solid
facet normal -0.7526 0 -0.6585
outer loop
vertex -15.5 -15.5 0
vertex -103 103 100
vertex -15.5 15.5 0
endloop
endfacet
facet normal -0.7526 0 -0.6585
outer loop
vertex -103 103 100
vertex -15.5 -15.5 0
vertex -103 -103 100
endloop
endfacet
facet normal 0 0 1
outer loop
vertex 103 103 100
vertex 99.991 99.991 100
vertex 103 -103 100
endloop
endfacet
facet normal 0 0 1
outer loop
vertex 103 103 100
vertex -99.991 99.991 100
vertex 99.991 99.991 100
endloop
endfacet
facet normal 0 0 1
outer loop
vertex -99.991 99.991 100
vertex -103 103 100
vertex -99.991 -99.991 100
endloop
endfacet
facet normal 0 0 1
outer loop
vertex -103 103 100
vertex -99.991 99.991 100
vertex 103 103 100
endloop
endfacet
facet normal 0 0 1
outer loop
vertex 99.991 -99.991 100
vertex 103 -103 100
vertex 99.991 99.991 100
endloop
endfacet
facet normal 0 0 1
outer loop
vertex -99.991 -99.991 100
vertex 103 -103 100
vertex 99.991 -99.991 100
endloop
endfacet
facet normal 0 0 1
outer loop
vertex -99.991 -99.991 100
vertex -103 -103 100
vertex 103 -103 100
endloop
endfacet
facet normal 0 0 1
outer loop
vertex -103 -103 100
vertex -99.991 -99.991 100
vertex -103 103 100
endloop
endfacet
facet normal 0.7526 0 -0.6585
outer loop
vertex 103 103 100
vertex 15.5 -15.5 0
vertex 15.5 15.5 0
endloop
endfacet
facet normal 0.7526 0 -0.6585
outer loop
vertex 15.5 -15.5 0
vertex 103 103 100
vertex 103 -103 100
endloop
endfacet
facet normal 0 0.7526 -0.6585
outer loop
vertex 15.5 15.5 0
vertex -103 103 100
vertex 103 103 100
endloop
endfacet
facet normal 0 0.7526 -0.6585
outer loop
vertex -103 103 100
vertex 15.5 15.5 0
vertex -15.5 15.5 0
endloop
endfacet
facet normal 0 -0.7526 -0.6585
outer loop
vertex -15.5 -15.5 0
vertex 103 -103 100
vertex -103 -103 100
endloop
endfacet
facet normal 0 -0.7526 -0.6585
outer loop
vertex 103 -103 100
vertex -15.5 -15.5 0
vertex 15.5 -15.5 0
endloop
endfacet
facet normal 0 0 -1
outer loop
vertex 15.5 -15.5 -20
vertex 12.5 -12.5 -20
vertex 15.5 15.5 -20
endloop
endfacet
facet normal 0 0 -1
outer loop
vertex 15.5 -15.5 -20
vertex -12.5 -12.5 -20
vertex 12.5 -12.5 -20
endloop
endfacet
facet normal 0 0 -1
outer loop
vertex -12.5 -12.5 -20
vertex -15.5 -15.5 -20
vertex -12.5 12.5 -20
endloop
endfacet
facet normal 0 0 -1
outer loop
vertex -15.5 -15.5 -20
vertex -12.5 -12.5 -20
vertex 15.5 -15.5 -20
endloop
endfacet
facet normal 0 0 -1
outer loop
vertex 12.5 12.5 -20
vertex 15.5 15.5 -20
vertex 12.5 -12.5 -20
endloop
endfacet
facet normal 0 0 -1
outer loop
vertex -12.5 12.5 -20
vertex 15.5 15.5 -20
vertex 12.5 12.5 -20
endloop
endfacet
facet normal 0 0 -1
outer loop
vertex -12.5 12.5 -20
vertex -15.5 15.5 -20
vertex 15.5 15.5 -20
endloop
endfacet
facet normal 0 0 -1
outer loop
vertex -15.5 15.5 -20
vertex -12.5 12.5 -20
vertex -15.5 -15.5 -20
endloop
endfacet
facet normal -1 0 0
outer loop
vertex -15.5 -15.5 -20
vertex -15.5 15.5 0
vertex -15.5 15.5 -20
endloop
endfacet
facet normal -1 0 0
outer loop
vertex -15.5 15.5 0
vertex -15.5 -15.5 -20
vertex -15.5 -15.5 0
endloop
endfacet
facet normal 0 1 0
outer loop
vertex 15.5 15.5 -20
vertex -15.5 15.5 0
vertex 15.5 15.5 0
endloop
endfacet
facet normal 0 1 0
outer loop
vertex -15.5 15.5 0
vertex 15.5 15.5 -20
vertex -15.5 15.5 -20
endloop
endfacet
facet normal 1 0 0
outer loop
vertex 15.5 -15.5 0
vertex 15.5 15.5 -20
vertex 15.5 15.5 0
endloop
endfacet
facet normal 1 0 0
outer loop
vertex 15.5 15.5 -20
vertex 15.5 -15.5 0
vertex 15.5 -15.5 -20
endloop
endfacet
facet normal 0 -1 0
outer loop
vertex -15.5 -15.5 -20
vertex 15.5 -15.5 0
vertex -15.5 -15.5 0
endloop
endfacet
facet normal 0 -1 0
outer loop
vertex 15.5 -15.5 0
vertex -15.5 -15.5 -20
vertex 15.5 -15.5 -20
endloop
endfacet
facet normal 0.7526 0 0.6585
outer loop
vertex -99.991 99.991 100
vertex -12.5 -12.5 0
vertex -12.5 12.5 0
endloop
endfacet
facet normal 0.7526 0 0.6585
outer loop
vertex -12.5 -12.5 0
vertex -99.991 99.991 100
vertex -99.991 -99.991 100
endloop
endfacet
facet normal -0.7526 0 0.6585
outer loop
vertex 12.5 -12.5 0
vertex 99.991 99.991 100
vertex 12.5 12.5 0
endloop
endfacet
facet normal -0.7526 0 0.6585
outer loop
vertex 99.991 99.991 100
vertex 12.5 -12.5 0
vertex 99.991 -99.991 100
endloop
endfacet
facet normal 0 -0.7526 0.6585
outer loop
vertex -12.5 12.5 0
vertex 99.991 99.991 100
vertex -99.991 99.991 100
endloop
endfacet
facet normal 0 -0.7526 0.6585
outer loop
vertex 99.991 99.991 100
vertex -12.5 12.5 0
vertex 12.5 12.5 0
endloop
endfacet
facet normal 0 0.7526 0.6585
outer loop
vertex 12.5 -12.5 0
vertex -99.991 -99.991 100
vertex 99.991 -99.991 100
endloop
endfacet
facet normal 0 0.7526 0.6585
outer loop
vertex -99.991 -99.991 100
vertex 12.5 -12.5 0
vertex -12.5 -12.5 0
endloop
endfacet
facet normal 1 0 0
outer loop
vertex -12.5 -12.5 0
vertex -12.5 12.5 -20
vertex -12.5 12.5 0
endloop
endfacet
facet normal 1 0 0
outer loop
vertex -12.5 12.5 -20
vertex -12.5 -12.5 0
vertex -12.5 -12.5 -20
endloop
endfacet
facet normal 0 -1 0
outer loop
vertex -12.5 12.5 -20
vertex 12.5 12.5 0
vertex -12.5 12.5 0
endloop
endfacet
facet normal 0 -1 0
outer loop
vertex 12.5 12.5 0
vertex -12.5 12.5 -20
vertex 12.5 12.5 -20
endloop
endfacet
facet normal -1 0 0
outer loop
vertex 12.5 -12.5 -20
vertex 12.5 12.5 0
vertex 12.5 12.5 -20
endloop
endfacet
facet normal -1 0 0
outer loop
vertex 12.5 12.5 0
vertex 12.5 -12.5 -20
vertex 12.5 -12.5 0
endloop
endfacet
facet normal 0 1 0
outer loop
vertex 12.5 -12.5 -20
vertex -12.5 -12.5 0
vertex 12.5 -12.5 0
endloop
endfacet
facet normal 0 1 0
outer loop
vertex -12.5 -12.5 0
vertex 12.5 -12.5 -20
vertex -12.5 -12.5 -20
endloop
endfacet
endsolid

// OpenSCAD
height=100;
diameter=200;
hole=25;
wall=3;
tunnelHeight=20;
containerCircle=false;
tunnelCircle=false;

module funnelBox_impl(height, diameter, 
					   hole, tunnelHeight,
					   containerCircle, tunnelCircle)
{
	linear_extrude(height, scale=diameter/hole)
	{
		if(containerCircle)
		{
			circle(d=hole);
		}
		else
		{
			square(hole,center=true);
		}
	}
	
	translate([0,0,-tunnelHeight])linear_extrude(height) 
	{	
		if(tunnelCircle)
		{
			circle(d=hole);
		}
		else
		{
			square(hole,center=true);
		}
	}
}

module funnelBoxInside(height=100, diameter=200, 
					   hole=25, wall=3, tunnelHeight=20,
					   containerCircle=false, tunnelCircle=false)
{			   
	funnelBox_impl(height+0.01, diameter, hole, tunnelHeight+0.01, containerCircle, tunnelCircle);
}

module funnelBoxOutside(height=100, diameter=200, 
					   hole=25, wall=3, tunnelHeight=20,
					   containerCircle=false, tunnelCircle=false)
{			   
	holeWall = hole + wall*2;
	diameterWall = diameter + wall*2;
	
	funnelBox_impl(height, diameterWall, holeWall, tunnelHeight, containerCircle, tunnelCircle);
}

module funnelBox(height=100, diameter=200, hole=25, wall=3, tunnelHeight=20,
				 containerCircle=false, tunnelCircle=false)
{
	difference()
	{
		funnelBoxOutside(height, diameter, hole, wall, tunnelHeight, containerCircle, tunnelCircle);
		
		funnelBoxInside(height, diameter, hole, wall, tunnelHeight, containerCircle, tunnelCircle);
		
	}
}

funnelBox(height,
diameter,
hole,
wall,
tunnelHeight,
containerCircle,
tunnelCircle);
